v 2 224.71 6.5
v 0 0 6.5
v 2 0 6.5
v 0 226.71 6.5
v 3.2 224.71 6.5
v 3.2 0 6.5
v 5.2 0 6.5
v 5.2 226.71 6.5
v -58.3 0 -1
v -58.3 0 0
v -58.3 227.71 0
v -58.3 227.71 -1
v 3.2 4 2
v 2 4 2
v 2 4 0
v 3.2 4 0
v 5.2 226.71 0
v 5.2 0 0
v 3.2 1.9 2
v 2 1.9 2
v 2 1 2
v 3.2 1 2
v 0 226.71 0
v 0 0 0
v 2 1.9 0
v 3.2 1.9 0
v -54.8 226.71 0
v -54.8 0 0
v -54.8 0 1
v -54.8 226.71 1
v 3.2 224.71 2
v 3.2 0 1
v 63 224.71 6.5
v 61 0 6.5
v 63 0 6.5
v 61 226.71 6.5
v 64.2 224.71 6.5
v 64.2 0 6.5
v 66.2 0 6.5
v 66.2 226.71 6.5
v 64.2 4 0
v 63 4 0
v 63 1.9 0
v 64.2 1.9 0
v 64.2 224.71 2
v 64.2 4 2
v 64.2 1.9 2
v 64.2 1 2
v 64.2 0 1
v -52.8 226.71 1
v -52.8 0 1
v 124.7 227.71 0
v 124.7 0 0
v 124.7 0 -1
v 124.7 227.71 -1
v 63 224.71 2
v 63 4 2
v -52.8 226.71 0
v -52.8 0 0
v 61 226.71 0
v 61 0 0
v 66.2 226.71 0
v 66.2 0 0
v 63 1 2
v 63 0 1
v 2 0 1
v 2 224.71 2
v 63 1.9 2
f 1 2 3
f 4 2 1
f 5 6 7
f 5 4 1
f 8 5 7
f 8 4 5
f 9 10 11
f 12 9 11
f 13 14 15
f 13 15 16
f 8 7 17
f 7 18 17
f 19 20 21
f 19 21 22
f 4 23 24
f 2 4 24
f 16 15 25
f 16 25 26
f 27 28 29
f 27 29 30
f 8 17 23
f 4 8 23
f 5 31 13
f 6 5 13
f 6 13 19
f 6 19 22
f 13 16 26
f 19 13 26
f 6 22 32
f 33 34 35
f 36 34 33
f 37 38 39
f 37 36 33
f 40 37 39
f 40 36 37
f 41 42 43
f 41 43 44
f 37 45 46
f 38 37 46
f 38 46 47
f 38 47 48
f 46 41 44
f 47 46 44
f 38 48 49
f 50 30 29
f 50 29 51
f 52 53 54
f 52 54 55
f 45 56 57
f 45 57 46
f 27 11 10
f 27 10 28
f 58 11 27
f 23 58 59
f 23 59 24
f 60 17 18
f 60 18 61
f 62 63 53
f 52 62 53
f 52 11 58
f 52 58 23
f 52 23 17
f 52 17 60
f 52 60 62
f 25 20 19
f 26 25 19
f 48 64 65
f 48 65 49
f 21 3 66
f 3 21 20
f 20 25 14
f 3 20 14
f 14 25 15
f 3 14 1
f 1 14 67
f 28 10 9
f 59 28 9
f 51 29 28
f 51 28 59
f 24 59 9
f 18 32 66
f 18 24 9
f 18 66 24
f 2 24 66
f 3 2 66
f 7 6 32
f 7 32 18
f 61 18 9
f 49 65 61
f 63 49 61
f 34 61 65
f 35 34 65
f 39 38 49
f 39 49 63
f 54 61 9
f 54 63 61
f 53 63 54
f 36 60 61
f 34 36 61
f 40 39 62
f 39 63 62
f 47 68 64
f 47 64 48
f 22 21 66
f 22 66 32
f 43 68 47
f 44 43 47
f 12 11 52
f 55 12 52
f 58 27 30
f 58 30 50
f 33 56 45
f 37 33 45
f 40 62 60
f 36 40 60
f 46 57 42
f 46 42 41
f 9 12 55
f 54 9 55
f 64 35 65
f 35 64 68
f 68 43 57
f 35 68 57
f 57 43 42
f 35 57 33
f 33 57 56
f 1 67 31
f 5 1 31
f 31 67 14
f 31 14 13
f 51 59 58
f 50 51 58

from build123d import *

# Parameters (mm, degrees)
F0_W     = 5.2
F0_H     = 226.71
F1_DEPTH = 2
F3_DEPTH = 4.5
F4_W     = 1.2
F4_H     = 2.1
F5_DEPTH = 25
F6_W     = 183
F6_H     = 227.71
F7_DEPTH = 1
F8_W     = 2
F8_H     = 226.71
F9_DEPTH = 1
F10_SIZE = 1


# Not quite as in the source:
# - a feature names something its author has since deleted; it is built from what else it names


with BuildPart() as f1:
    # F0 (on Top) → F1 (new body)
    with BuildSketch(Plane.XY):
        with Locations((2.6, 113.355)):
            Rectangle(F0_W, F0_H)
    extrude(amount=F1_DEPTH)

    # F2 (on face) → F3 (join)
    with BuildSketch(Plane.XY.offset(2)):
        Polygon((0, 226.71), (0, 0), (2, 0), (2, 224.71), (3.2, 224.71), (3.2, 0), (5.2, 0), (5.2, 226.71), align=None)
    extrude(amount=F3_DEPTH)


with BuildPart() as f1b:
    # F0 (on Top) → F1, piece 2 (new body)
    with BuildSketch(Plane.XY):
        with Locations((63.6, 113.355)):
            Rectangle(F0_W, F0_H)
    extrude(amount=F1_DEPTH)

    # F2 (on face) → F3, piece 2 (join)
    with BuildSketch(Plane.XY.offset(2)):
        Polygon((61, 226.71), (61, 0), (63, 0), (63, 224.71), (64.2, 224.71), (64.2, 0), (66.2, 0), (66.2, 226.71), align=None)
    extrude(amount=F3_DEPTH)


with BuildPart() as f5_tool:
    # F4 (on face) → F5 (new body)
    with BuildSketch(Plane.XY.offset(2)):
        with Locations((2.6, 2.95)):
            Rectangle(F4_W, F4_H)
        with Locations((63.6, 2.95)):
            Rectangle(F4_W, F4_H)
    extrude(amount=-F5_DEPTH)


with BuildPart() as f1_1:
    add(f1.part)

    # F5: cut by f5_tool
    add(f5_tool.part, mode=Mode.SUBTRACT)



with BuildPart() as f1b_1:
    add(f1b.part)

    # F5: cut by f5_tool
    add(f5_tool.part, mode=Mode.SUBTRACT)


with BuildPart() as f1_2:
    add(f1_1.part)

    add(f1b_1.part)  # F7 merges F1b
    # F6 (on Top) → F7 (join)
    with BuildSketch(Plane.XY):
        with Locations((33.2, 113.855)):
            Rectangle(F6_W, F6_H)
    extrude(amount=-F7_DEPTH)

    # F8 (on face) → F9 (join)
    with BuildSketch(Plane.XY):
        with Locations((-53.8, 113.355)):
            Rectangle(F8_W, F8_H)
    extrude(amount=F9_DEPTH)

    # F10
    f10_edges = [f1_2.edges().sort_by_distance(p)[0] for p in [
        (2.6, 0, 2),
        (63.6, 0, 2),
    ]]
    chamfer(f10_edges, length=F10_SIZE)


solid = f1_2.part
